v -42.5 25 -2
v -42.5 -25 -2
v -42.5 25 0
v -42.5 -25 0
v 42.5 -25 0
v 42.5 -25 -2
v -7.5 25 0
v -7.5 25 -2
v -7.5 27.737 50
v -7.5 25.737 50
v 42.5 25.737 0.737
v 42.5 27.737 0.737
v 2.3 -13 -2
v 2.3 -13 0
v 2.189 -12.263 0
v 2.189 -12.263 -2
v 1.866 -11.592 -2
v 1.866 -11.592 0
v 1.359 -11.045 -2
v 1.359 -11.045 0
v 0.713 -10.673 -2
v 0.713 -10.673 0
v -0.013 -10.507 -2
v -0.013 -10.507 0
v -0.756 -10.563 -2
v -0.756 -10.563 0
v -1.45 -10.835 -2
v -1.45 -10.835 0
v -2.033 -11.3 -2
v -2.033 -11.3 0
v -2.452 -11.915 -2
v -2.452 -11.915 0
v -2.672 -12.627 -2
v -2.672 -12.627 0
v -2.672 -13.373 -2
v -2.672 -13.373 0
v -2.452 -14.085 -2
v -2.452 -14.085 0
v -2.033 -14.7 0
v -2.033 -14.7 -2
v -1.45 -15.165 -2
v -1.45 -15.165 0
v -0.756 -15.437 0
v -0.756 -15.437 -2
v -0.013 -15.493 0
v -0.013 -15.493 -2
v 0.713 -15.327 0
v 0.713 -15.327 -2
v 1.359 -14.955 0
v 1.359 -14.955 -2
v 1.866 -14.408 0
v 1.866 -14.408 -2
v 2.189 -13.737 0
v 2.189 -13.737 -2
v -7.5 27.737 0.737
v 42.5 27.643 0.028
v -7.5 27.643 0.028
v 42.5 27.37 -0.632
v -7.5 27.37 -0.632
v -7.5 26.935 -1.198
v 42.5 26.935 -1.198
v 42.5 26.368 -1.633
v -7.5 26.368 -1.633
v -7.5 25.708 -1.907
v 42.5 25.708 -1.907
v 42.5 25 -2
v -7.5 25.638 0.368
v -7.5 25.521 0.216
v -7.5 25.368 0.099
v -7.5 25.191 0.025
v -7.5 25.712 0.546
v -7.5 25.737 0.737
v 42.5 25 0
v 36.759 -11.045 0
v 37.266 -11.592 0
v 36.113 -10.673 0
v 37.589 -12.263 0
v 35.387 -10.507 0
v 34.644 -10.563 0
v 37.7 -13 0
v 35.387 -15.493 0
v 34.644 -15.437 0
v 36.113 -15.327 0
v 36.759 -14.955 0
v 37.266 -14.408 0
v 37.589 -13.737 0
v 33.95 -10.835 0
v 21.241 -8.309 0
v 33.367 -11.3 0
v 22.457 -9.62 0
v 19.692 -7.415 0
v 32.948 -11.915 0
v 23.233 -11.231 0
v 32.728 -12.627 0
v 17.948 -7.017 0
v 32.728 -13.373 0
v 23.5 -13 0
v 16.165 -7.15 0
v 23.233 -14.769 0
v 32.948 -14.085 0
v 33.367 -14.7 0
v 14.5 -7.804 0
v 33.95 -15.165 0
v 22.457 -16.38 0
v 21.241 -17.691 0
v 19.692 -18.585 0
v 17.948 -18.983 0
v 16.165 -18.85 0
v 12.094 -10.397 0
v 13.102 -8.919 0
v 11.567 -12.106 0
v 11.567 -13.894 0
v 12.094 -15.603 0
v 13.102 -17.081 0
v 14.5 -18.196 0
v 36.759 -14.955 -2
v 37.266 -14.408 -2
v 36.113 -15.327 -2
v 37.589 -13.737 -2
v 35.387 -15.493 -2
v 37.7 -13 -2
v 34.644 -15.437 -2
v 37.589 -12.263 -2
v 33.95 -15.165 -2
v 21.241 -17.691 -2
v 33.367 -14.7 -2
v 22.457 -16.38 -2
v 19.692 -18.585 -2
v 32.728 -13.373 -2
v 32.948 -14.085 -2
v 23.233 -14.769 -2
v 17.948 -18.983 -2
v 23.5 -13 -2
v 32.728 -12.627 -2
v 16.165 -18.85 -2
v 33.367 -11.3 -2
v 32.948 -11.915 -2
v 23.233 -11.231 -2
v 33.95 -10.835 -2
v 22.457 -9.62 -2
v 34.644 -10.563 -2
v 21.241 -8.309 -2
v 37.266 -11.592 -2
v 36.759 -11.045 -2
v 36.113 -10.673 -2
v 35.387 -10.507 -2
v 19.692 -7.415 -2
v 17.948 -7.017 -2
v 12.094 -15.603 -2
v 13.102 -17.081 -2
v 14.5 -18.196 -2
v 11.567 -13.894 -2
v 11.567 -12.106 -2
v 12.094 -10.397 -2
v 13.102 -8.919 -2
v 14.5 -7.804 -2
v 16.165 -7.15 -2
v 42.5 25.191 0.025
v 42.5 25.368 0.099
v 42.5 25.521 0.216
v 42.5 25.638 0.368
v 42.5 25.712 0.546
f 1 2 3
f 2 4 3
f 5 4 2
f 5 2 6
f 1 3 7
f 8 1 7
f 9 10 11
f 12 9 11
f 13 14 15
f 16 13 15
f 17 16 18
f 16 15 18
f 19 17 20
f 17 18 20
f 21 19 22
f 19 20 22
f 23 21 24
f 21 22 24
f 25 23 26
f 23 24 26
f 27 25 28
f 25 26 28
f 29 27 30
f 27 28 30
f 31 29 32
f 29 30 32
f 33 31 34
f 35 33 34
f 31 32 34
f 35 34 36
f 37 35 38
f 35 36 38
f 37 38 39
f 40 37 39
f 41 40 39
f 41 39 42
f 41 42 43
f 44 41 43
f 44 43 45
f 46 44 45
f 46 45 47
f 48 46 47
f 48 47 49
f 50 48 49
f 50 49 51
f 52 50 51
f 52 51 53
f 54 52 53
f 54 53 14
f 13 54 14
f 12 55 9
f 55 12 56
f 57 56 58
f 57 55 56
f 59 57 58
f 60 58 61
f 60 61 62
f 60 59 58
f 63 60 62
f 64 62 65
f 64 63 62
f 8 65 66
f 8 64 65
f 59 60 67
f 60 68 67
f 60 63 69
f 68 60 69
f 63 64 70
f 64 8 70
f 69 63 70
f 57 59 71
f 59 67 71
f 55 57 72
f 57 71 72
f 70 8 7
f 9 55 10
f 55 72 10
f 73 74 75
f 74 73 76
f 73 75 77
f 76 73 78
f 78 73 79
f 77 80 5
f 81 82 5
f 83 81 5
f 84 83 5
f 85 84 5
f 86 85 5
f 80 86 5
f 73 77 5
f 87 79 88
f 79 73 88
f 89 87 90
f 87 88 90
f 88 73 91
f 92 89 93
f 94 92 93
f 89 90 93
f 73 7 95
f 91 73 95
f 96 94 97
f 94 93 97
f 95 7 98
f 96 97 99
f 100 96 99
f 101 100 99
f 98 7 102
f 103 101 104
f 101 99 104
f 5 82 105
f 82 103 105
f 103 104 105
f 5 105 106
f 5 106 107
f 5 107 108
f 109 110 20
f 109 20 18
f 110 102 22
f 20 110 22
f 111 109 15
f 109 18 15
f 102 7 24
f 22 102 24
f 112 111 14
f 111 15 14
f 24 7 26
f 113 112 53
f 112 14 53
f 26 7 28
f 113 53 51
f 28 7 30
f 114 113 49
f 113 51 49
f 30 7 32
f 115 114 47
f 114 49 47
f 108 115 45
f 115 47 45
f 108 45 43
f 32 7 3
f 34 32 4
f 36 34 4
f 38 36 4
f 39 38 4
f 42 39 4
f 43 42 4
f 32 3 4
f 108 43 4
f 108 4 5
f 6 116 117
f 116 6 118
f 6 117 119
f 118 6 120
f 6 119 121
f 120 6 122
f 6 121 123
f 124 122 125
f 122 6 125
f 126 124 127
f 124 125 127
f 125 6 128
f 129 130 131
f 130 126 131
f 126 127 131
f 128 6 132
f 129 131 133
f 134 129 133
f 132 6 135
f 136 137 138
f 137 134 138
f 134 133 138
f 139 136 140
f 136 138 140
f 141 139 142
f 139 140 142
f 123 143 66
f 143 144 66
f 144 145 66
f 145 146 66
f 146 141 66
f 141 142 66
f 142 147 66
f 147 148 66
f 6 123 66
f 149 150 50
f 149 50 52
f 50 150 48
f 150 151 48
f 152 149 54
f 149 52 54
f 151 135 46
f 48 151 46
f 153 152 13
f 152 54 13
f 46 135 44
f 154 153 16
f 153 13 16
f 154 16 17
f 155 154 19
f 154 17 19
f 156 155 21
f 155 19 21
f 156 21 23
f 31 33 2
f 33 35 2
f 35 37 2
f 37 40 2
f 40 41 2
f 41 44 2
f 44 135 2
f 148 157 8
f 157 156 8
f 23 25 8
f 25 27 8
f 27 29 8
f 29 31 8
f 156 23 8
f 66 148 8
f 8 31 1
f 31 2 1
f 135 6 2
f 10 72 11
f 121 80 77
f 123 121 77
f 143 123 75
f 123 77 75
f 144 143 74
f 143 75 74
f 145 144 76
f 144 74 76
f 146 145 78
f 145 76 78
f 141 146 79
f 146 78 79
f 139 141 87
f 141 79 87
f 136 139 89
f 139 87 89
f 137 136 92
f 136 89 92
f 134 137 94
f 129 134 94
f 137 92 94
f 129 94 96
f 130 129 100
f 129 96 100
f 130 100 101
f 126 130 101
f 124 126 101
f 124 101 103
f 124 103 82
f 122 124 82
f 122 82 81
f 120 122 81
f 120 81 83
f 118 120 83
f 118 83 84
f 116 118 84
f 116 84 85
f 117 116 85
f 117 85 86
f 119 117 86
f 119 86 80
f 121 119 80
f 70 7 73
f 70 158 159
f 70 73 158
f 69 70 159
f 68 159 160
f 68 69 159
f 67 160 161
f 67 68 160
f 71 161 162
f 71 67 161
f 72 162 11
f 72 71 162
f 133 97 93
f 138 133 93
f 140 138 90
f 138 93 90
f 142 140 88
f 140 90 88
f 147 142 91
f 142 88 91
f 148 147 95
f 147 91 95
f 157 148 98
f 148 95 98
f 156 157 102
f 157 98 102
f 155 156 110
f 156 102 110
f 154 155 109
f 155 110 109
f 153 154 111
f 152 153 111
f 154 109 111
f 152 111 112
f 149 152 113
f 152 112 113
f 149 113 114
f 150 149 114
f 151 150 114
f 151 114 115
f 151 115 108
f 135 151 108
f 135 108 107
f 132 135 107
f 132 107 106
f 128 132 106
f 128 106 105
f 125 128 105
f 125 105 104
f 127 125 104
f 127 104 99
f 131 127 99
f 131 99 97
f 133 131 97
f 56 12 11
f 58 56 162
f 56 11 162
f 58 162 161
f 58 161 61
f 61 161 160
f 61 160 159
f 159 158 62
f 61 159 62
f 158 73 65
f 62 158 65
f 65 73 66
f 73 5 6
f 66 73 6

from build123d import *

# Parameters (mm, degrees)
CROQUIS1_W             = 85
CROQUIS1_H             = 50
BRIDA_BASE1_DEPTH      = 2
BRIDA_DE_ARISTA1_DEPTH = 85
DESDOBLAR1_START       = -42.5
DESDOBLAR1_DEPTH       = 85
DESDOBLAR1_2_DEPTH     = 85
CROQUIS11_W            = 35
CROQUIS11_H            = 49.2634
CROQUIS11_H_2          = 2.727844901
CORTAR_EXTRUIR1_DEPTH  = 10
DOBLAR1_START          = 27.727844901
DOBLAR1_OUTLINE_W      = 50
DOBLAR1_OUTLINE_H      = 2
DOBLAR1_DEPTH          = 50.272155099
DOBLAR1_START_2        = 25.7366
DOBLAR1_2_DEPTH        = 1.725934706
DOBLAR1_START_3        = 25
DOBLAR1_3_DEPTH        = 2.7366
DOBLAR1_START_4        = -7.5
DOBLAR1_4_DEPTH        = 50.5
CROQUIS12_R            = 6
CROQUIS12_R_2          = 2.5
CORTAR_EXTRUIR2_DEPTH  = 10


with BuildPart() as part:
    # Brida base1: sheet metal written as solids
    # Croquis1 → Brida base1 (new body)
    with BuildSketch(Plane.XY):
        Rectangle(CROQUIS1_W, CROQUIS1_H)
    extrude(amount=-BRIDA_BASE1_DEPTH)

    # Brida de arista1: sheet metal written as solids
    # Brida de arista1 section (on a plane across the edge) → Brida de arista1 (add)
    with BuildSketch(Plane(origin=(42.5, 25.7366, 0), x_dir=(0, -1, 0), z_dir=(-1, 0, 0))):
        with BuildLine():
            Line((-2, 0.7366), (-2, 50))
            Line((-2, 50), (0, 50))
            Line((0, 50), (0, 0.7366))
            ThreePointArc((0, 0.7366), (0.215745145, 0.215745145), (0.7366, 0))
            Line((0.7366, 0), (0.7366, -2))
            ThreePointArc((0.7366, -2), (-1.198468417, -1.198468417), (-2, 0.7366))
        make_face()
    extrude(amount=BRIDA_DE_ARISTA1_DEPTH)

    # Desdoblar1: read off the stored shape, not the designer's step
    # Desdoblar1 outline → Desdoblar1 (cut)
    with BuildSketch(Plane.YZ.offset(DESDOBLAR1_START)):
        with BuildLine():
            Line((25, 0), (27.635602398, 0))
            ThreePointArc((27.635602398, 0), (27.711233029, 0.364854094), (27.7366, 0.7366))
            Line((27.7366, 0.7366), (27.7366, 50))
            Line((27.7366, 50), (25.7366, 50))
            Line((25.7366, 50), (25.7366, 0.7366))
            ThreePointArc((25.7366, 0.7366), (25.520854855, 0.215745145), (25, 0))
        make_face()
    extrude(amount=DESDOBLAR1_DEPTH, mode=Mode.SUBTRACT)

    # Desdoblar1 2 outline → Desdoblar1 2 (add)
    with BuildSketch(Plane.YZ.offset(DESDOBLAR1_START)):
        with BuildLine():
            Line((25, -2), (76.991244901, -2))
            Line((76.991244901, -2), (76.991244901, 0))
            Line((76.991244901, 0), (27.635602398, 0))
            ThreePointArc((27.635602398, 0), (26.654267209, -1.443395312), (25, -2))
        make_face()
    extrude(amount=DESDOBLAR1_2_DEPTH)

    # Croquis11 → Cortar-Extruir1 (cut)
    with BuildSketch(Plane.XY):
        with Locations((-25, 52.359544901)):
            Rectangle(CROQUIS11_W, CROQUIS11_H)
        with Locations((-25, 26.36392245)):
            Rectangle(CROQUIS11_W, CROQUIS11_H_2)
        Polygon((42.5, 76.991244901), (-7.5, 76.991244901), (42.5, 27.727844901), align=None)
    extrude(amount=-CORTAR_EXTRUIR1_DEPTH, mode=Mode.SUBTRACT)

    # Doblar1: read off the stored shape, not the designer's step
    # Doblar1 outline → Doblar1 (cut)
    with BuildSketch(Plane(origin=(0, 0, 0), x_dir=(1, 0, 0), z_dir=(0, 1, 0)).offset(DOBLAR1_START)):
        with Locations((17.5, 1)):
            Rectangle(DOBLAR1_OUTLINE_W, DOBLAR1_OUTLINE_H)
    extrude(amount=DOBLAR1_DEPTH, mode=Mode.SUBTRACT)

    # Doblar1 2 outline → Doblar1 2 (add)
    with BuildSketch(Plane(origin=(0, 0, 0), x_dir=(1, 0, 0), z_dir=(0, 1, 0)).offset(DOBLAR1_START_2)):
        Polygon((-7.5, -50), (42.5, -0.7366), (42.5, 0), (-7.5, 0), align=None)
    extrude(amount=DOBLAR1_2_DEPTH)

    # Doblar1 3 outline → Doblar1 3 (add)
    with BuildSketch(Plane(origin=(0, 0, 0), x_dir=(1, 0, 0), z_dir=(0, 1, 0)).offset(DOBLAR1_START_3)):
        Polygon((-7.5, 0), (-7.5, -50), (42.5, -0.7366), (42.5, 0), align=None)
    extrude(amount=DOBLAR1_3_DEPTH)

    # Doblar1 4 outline → Doblar1 4 (cut)
    with BuildSketch(Plane.YZ.offset(DOBLAR1_START_4)):
        with BuildLine():
            ThreePointArc((27.7366, 0.7366), (26.935068417, -1.198468417), (25, -2))
            Line((25, -2), (24, -2))
            Line((24, -2), (24, -4))
            Line((24, -4), (27.727844901, -4))
            Line((27.727844901, -4), (27.727844901, 0))
            Line((27.727844901, 0), (29, 0))
            Line((29, 0), (29, 52))
            Line((29, 52), (27.736600025, 52))
            Line((27.736600025, 52), (27.7366, 0.7366))
        make_face()
        with BuildLine():
            Line((25.7366, 0.7366), (25.7366, 52))
            Line((25.7366, 52), (25, 52))
            Line((25, 52), (25, 0))
            ThreePointArc((25, 0), (25.520854855, 0.215745145), (25.7366, 0.7366))
        make_face()
    extrude(amount=DOBLAR1_4_DEPTH, mode=Mode.SUBTRACT)

    # Croquis12 → Cortar-Extruir2 (cut)
    with BuildSketch(Plane.XY):
        with Locations((17.5, -13)):
            Circle(CROQUIS12_R)
        with Locations((35.2, -13)):
            Circle(CROQUIS12_R_2)
        with Locations((-0.2, -13)):
            Circle(CROQUIS12_R_2)
    extrude(amount=-CORTAR_EXTRUIR2_DEPTH, mode=Mode.SUBTRACT)


solid = part.part
